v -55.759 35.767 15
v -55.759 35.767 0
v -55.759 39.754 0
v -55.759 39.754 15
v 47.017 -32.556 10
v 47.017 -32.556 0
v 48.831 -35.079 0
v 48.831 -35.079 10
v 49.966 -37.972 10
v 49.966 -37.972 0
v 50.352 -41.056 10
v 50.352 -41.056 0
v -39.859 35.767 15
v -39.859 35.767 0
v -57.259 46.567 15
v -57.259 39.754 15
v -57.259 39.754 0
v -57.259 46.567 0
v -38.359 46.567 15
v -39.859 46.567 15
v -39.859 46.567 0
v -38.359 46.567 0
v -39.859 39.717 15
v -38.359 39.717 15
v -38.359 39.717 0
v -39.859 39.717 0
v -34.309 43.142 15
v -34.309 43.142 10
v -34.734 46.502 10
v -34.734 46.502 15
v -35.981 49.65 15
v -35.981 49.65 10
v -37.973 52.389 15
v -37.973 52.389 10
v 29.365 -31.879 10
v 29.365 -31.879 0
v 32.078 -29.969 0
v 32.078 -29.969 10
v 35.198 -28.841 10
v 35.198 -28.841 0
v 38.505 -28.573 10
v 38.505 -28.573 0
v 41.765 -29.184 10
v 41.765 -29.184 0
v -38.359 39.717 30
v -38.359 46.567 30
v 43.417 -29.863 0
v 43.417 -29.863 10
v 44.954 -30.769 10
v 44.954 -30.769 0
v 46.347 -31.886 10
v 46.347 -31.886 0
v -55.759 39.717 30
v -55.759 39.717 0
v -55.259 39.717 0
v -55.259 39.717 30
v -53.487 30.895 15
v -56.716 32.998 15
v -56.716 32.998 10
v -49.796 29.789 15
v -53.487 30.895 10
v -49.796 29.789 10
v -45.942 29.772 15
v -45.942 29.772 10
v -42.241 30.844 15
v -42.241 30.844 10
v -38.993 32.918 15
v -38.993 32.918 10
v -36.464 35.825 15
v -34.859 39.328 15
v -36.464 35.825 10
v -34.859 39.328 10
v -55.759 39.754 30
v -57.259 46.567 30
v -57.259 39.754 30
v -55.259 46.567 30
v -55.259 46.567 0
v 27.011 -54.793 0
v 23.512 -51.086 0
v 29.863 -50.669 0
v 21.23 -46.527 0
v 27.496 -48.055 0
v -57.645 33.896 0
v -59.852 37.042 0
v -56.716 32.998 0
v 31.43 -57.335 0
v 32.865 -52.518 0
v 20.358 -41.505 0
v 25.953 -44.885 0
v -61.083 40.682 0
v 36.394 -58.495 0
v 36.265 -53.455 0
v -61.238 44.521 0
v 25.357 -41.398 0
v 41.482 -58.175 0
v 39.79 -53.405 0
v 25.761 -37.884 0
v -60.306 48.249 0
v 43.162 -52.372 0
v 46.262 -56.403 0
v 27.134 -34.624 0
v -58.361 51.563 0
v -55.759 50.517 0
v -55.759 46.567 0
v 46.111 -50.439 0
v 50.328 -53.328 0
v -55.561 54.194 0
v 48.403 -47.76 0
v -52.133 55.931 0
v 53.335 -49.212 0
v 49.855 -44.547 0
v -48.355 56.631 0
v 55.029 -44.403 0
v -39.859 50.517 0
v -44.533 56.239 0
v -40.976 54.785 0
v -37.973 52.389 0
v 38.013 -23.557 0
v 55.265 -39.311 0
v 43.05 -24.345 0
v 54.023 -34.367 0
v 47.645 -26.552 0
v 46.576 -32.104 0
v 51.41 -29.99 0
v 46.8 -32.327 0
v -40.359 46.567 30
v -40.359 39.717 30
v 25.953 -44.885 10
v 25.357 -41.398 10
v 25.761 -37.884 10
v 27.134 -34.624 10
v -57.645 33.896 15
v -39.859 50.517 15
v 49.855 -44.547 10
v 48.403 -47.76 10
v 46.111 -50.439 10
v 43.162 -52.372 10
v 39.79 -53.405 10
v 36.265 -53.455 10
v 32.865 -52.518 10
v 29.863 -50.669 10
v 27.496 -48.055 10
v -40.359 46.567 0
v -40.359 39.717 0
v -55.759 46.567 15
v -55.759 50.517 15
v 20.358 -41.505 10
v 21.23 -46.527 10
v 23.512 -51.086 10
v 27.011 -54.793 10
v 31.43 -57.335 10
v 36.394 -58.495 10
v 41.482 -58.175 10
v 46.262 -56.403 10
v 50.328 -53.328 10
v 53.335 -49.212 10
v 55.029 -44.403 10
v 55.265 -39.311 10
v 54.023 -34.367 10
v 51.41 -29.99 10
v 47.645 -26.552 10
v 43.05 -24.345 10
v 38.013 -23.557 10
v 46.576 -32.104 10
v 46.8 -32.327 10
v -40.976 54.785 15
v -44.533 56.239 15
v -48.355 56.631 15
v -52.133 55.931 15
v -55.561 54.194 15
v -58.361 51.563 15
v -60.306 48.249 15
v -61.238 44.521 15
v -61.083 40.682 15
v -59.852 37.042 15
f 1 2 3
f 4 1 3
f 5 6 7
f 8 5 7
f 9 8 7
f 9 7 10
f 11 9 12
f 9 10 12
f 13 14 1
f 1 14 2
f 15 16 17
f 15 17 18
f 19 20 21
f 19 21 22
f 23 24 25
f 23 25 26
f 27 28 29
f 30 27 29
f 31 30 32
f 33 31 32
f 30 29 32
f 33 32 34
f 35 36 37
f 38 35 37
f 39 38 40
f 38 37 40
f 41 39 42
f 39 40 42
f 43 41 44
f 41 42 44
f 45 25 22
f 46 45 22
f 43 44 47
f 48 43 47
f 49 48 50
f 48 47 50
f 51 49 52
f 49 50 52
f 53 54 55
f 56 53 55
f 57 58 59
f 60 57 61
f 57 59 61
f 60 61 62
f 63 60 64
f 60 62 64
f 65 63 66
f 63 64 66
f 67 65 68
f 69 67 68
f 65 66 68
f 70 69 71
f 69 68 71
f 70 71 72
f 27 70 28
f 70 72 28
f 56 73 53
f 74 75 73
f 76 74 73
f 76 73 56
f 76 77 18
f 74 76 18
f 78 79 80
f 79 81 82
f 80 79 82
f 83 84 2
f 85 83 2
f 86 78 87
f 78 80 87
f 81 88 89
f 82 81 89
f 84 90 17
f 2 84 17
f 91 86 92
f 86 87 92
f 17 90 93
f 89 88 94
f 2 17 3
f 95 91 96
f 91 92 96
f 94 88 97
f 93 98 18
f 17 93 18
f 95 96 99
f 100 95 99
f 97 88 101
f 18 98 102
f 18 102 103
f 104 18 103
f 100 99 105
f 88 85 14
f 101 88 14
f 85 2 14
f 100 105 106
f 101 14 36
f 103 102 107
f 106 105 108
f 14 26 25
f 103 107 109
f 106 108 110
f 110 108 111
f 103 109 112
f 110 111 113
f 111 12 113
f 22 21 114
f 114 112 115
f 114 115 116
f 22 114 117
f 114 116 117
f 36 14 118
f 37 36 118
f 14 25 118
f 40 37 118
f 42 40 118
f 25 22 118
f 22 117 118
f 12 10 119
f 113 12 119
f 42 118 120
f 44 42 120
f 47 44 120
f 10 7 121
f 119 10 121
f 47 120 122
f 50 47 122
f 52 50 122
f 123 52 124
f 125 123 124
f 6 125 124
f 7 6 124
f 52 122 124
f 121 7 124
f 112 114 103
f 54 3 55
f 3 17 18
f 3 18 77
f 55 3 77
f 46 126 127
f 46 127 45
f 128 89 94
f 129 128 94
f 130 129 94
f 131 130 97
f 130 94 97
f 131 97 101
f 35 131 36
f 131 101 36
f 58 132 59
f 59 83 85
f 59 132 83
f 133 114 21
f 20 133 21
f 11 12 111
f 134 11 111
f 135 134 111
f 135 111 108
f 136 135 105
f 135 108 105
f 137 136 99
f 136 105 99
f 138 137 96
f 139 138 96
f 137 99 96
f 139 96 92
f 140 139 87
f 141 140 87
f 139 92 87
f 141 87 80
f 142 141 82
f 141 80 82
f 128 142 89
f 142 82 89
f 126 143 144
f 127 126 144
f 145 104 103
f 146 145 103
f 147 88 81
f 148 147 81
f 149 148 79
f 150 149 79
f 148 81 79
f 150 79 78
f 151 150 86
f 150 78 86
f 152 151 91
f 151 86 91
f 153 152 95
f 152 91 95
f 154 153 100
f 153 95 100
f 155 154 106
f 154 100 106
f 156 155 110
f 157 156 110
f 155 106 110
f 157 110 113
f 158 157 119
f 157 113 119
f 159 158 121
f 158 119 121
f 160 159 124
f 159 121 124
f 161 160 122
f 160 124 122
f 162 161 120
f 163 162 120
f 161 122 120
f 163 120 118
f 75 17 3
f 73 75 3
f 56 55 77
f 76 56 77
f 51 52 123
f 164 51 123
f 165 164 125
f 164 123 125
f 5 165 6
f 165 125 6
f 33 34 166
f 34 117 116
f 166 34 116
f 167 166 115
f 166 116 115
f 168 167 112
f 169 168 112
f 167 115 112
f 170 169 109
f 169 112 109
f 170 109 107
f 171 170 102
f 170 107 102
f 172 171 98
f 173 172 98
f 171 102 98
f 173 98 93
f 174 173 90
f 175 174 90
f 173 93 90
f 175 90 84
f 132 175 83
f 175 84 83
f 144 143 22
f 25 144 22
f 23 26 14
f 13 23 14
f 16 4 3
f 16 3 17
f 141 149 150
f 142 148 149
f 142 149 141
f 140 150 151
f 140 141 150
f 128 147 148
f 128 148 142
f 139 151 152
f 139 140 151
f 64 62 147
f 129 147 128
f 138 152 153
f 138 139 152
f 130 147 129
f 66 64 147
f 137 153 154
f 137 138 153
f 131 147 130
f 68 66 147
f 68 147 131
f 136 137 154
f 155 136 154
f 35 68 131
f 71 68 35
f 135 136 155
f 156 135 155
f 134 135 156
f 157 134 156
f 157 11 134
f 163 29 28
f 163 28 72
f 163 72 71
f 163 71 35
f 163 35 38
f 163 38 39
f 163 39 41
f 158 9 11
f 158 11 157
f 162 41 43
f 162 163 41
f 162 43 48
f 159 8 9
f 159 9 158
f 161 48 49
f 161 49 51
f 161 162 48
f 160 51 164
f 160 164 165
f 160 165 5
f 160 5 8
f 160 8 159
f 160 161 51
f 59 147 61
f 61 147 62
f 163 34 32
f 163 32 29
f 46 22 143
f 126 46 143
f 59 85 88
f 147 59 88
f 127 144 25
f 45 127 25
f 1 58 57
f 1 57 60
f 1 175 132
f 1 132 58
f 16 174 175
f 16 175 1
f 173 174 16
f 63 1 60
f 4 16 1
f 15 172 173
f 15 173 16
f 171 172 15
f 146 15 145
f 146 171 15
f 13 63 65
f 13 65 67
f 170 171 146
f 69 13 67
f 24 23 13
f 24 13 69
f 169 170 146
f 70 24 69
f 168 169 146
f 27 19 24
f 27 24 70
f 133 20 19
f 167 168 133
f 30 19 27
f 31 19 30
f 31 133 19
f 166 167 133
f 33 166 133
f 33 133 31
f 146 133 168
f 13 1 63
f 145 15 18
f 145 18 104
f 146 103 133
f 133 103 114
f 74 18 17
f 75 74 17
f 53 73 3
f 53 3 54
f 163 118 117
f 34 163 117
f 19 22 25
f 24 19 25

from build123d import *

# Parameters (mm, degrees)
F1_DEPTH = 30
F2_DEPTH = 15
F3_DEPTH = 10


with BuildPart() as f1:
    # F0 (on Top) → F1 (new body)
    with BuildSketch(Plane.XY):
        Polygon((-55.258995, 46.567235), (-55.758995, 46.567235), (-57.258995, 46.567235), (-57.258995, 39.753549), (-55.758995, 39.753549), (-55.758995, 39.717235), (-55.258995, 39.717235), align=None)
        Polygon((-38.358995, 46.567235), (-39.858995, 46.567235), (-40.358995, 46.567235), (-40.358995, 39.717235), (-39.858995, 39.717235), (-38.358995, 39.717235), align=None)
    extrude(amount=F1_DEPTH)


with BuildPart() as f2:
    # F0 (on Top) → F2 (new body)
    with BuildSketch(Plane.XY):
        with BuildLine():
            ThreePointArc((-56.716251, 32.997739), (-42.241139, 30.843903), (-34.308995, 43.142235))
            ThreePointArc((-34.308995, 43.142235), (-35.25825, 48.115041), (-37.972522, 52.38852))
            ThreePointArc((-37.972522, 52.38852), (-57.05528, 52.978709), (-57.645469, 33.89595))
            Line((-57.645469, 33.89595), (-56.716251, 32.997739))
        make_face()
        Polygon((-55.758995, 46.567235), (-55.758995, 50.517235), (-39.858995, 50.517235), (-39.858995, 46.567235), (-38.358995, 46.567235), (-38.358995, 39.717235), (-39.858995, 39.717235), (-39.858995, 35.767235), (-55.758995, 35.767235), (-55.758995, 39.717235), (-55.758995, 39.753549), (-57.258995, 39.753549), (-57.258995, 46.567235), align=None, mode=Mode.SUBTRACT)
    extrude(amount=F2_DEPTH)

    # F0 (on Top) → F3 (join)
    with BuildSketch(Plane.XY):
        with BuildLine():
            ThreePointArc((-37.972522, 52.38852), (-35.25825, 48.115041), (-34.308995, 43.142235))
            ThreePointArc((-34.308995, 43.142235), (-42.241139, 30.843903), (-56.716251, 32.997739))
            Line((-56.716251, 32.997739), (20.358005, -41.504626))
            ThreePointArc((20.358005, -41.504626), (50.327961, -53.327973), (38.013308, -23.556526))
            Line((38.013308, -23.556526), (-37.972522, 52.38852))
        make_face()
        with BuildLine():
            ThreePointArc((47.0174, -32.555785), (49.488708, -36.490393), (50.352249, -41.055785))
            ThreePointArc((50.352249, -41.055785), (39.790212, -53.404643), (25.953161, -44.884846))
            ThreePointArc((25.953161, -44.884846), (25.7614, -37.883817), (29.365288, -31.878557))
            ThreePointArc((29.365288, -31.878557), (35.197909, -28.840856), (41.7652, -29.18402))
            ThreePointArc((41.7652, -29.18402), (44.201664, -30.288476), (46.347327, -31.886071))
            ThreePointArc((46.347327, -31.886071), (46.68871, -32.214578), (47.0174, -32.555785))
        make_face(mode=Mode.SUBTRACT)
    extrude(amount=F3_DEPTH)


solid = Compound([f1.part, f2.part])
